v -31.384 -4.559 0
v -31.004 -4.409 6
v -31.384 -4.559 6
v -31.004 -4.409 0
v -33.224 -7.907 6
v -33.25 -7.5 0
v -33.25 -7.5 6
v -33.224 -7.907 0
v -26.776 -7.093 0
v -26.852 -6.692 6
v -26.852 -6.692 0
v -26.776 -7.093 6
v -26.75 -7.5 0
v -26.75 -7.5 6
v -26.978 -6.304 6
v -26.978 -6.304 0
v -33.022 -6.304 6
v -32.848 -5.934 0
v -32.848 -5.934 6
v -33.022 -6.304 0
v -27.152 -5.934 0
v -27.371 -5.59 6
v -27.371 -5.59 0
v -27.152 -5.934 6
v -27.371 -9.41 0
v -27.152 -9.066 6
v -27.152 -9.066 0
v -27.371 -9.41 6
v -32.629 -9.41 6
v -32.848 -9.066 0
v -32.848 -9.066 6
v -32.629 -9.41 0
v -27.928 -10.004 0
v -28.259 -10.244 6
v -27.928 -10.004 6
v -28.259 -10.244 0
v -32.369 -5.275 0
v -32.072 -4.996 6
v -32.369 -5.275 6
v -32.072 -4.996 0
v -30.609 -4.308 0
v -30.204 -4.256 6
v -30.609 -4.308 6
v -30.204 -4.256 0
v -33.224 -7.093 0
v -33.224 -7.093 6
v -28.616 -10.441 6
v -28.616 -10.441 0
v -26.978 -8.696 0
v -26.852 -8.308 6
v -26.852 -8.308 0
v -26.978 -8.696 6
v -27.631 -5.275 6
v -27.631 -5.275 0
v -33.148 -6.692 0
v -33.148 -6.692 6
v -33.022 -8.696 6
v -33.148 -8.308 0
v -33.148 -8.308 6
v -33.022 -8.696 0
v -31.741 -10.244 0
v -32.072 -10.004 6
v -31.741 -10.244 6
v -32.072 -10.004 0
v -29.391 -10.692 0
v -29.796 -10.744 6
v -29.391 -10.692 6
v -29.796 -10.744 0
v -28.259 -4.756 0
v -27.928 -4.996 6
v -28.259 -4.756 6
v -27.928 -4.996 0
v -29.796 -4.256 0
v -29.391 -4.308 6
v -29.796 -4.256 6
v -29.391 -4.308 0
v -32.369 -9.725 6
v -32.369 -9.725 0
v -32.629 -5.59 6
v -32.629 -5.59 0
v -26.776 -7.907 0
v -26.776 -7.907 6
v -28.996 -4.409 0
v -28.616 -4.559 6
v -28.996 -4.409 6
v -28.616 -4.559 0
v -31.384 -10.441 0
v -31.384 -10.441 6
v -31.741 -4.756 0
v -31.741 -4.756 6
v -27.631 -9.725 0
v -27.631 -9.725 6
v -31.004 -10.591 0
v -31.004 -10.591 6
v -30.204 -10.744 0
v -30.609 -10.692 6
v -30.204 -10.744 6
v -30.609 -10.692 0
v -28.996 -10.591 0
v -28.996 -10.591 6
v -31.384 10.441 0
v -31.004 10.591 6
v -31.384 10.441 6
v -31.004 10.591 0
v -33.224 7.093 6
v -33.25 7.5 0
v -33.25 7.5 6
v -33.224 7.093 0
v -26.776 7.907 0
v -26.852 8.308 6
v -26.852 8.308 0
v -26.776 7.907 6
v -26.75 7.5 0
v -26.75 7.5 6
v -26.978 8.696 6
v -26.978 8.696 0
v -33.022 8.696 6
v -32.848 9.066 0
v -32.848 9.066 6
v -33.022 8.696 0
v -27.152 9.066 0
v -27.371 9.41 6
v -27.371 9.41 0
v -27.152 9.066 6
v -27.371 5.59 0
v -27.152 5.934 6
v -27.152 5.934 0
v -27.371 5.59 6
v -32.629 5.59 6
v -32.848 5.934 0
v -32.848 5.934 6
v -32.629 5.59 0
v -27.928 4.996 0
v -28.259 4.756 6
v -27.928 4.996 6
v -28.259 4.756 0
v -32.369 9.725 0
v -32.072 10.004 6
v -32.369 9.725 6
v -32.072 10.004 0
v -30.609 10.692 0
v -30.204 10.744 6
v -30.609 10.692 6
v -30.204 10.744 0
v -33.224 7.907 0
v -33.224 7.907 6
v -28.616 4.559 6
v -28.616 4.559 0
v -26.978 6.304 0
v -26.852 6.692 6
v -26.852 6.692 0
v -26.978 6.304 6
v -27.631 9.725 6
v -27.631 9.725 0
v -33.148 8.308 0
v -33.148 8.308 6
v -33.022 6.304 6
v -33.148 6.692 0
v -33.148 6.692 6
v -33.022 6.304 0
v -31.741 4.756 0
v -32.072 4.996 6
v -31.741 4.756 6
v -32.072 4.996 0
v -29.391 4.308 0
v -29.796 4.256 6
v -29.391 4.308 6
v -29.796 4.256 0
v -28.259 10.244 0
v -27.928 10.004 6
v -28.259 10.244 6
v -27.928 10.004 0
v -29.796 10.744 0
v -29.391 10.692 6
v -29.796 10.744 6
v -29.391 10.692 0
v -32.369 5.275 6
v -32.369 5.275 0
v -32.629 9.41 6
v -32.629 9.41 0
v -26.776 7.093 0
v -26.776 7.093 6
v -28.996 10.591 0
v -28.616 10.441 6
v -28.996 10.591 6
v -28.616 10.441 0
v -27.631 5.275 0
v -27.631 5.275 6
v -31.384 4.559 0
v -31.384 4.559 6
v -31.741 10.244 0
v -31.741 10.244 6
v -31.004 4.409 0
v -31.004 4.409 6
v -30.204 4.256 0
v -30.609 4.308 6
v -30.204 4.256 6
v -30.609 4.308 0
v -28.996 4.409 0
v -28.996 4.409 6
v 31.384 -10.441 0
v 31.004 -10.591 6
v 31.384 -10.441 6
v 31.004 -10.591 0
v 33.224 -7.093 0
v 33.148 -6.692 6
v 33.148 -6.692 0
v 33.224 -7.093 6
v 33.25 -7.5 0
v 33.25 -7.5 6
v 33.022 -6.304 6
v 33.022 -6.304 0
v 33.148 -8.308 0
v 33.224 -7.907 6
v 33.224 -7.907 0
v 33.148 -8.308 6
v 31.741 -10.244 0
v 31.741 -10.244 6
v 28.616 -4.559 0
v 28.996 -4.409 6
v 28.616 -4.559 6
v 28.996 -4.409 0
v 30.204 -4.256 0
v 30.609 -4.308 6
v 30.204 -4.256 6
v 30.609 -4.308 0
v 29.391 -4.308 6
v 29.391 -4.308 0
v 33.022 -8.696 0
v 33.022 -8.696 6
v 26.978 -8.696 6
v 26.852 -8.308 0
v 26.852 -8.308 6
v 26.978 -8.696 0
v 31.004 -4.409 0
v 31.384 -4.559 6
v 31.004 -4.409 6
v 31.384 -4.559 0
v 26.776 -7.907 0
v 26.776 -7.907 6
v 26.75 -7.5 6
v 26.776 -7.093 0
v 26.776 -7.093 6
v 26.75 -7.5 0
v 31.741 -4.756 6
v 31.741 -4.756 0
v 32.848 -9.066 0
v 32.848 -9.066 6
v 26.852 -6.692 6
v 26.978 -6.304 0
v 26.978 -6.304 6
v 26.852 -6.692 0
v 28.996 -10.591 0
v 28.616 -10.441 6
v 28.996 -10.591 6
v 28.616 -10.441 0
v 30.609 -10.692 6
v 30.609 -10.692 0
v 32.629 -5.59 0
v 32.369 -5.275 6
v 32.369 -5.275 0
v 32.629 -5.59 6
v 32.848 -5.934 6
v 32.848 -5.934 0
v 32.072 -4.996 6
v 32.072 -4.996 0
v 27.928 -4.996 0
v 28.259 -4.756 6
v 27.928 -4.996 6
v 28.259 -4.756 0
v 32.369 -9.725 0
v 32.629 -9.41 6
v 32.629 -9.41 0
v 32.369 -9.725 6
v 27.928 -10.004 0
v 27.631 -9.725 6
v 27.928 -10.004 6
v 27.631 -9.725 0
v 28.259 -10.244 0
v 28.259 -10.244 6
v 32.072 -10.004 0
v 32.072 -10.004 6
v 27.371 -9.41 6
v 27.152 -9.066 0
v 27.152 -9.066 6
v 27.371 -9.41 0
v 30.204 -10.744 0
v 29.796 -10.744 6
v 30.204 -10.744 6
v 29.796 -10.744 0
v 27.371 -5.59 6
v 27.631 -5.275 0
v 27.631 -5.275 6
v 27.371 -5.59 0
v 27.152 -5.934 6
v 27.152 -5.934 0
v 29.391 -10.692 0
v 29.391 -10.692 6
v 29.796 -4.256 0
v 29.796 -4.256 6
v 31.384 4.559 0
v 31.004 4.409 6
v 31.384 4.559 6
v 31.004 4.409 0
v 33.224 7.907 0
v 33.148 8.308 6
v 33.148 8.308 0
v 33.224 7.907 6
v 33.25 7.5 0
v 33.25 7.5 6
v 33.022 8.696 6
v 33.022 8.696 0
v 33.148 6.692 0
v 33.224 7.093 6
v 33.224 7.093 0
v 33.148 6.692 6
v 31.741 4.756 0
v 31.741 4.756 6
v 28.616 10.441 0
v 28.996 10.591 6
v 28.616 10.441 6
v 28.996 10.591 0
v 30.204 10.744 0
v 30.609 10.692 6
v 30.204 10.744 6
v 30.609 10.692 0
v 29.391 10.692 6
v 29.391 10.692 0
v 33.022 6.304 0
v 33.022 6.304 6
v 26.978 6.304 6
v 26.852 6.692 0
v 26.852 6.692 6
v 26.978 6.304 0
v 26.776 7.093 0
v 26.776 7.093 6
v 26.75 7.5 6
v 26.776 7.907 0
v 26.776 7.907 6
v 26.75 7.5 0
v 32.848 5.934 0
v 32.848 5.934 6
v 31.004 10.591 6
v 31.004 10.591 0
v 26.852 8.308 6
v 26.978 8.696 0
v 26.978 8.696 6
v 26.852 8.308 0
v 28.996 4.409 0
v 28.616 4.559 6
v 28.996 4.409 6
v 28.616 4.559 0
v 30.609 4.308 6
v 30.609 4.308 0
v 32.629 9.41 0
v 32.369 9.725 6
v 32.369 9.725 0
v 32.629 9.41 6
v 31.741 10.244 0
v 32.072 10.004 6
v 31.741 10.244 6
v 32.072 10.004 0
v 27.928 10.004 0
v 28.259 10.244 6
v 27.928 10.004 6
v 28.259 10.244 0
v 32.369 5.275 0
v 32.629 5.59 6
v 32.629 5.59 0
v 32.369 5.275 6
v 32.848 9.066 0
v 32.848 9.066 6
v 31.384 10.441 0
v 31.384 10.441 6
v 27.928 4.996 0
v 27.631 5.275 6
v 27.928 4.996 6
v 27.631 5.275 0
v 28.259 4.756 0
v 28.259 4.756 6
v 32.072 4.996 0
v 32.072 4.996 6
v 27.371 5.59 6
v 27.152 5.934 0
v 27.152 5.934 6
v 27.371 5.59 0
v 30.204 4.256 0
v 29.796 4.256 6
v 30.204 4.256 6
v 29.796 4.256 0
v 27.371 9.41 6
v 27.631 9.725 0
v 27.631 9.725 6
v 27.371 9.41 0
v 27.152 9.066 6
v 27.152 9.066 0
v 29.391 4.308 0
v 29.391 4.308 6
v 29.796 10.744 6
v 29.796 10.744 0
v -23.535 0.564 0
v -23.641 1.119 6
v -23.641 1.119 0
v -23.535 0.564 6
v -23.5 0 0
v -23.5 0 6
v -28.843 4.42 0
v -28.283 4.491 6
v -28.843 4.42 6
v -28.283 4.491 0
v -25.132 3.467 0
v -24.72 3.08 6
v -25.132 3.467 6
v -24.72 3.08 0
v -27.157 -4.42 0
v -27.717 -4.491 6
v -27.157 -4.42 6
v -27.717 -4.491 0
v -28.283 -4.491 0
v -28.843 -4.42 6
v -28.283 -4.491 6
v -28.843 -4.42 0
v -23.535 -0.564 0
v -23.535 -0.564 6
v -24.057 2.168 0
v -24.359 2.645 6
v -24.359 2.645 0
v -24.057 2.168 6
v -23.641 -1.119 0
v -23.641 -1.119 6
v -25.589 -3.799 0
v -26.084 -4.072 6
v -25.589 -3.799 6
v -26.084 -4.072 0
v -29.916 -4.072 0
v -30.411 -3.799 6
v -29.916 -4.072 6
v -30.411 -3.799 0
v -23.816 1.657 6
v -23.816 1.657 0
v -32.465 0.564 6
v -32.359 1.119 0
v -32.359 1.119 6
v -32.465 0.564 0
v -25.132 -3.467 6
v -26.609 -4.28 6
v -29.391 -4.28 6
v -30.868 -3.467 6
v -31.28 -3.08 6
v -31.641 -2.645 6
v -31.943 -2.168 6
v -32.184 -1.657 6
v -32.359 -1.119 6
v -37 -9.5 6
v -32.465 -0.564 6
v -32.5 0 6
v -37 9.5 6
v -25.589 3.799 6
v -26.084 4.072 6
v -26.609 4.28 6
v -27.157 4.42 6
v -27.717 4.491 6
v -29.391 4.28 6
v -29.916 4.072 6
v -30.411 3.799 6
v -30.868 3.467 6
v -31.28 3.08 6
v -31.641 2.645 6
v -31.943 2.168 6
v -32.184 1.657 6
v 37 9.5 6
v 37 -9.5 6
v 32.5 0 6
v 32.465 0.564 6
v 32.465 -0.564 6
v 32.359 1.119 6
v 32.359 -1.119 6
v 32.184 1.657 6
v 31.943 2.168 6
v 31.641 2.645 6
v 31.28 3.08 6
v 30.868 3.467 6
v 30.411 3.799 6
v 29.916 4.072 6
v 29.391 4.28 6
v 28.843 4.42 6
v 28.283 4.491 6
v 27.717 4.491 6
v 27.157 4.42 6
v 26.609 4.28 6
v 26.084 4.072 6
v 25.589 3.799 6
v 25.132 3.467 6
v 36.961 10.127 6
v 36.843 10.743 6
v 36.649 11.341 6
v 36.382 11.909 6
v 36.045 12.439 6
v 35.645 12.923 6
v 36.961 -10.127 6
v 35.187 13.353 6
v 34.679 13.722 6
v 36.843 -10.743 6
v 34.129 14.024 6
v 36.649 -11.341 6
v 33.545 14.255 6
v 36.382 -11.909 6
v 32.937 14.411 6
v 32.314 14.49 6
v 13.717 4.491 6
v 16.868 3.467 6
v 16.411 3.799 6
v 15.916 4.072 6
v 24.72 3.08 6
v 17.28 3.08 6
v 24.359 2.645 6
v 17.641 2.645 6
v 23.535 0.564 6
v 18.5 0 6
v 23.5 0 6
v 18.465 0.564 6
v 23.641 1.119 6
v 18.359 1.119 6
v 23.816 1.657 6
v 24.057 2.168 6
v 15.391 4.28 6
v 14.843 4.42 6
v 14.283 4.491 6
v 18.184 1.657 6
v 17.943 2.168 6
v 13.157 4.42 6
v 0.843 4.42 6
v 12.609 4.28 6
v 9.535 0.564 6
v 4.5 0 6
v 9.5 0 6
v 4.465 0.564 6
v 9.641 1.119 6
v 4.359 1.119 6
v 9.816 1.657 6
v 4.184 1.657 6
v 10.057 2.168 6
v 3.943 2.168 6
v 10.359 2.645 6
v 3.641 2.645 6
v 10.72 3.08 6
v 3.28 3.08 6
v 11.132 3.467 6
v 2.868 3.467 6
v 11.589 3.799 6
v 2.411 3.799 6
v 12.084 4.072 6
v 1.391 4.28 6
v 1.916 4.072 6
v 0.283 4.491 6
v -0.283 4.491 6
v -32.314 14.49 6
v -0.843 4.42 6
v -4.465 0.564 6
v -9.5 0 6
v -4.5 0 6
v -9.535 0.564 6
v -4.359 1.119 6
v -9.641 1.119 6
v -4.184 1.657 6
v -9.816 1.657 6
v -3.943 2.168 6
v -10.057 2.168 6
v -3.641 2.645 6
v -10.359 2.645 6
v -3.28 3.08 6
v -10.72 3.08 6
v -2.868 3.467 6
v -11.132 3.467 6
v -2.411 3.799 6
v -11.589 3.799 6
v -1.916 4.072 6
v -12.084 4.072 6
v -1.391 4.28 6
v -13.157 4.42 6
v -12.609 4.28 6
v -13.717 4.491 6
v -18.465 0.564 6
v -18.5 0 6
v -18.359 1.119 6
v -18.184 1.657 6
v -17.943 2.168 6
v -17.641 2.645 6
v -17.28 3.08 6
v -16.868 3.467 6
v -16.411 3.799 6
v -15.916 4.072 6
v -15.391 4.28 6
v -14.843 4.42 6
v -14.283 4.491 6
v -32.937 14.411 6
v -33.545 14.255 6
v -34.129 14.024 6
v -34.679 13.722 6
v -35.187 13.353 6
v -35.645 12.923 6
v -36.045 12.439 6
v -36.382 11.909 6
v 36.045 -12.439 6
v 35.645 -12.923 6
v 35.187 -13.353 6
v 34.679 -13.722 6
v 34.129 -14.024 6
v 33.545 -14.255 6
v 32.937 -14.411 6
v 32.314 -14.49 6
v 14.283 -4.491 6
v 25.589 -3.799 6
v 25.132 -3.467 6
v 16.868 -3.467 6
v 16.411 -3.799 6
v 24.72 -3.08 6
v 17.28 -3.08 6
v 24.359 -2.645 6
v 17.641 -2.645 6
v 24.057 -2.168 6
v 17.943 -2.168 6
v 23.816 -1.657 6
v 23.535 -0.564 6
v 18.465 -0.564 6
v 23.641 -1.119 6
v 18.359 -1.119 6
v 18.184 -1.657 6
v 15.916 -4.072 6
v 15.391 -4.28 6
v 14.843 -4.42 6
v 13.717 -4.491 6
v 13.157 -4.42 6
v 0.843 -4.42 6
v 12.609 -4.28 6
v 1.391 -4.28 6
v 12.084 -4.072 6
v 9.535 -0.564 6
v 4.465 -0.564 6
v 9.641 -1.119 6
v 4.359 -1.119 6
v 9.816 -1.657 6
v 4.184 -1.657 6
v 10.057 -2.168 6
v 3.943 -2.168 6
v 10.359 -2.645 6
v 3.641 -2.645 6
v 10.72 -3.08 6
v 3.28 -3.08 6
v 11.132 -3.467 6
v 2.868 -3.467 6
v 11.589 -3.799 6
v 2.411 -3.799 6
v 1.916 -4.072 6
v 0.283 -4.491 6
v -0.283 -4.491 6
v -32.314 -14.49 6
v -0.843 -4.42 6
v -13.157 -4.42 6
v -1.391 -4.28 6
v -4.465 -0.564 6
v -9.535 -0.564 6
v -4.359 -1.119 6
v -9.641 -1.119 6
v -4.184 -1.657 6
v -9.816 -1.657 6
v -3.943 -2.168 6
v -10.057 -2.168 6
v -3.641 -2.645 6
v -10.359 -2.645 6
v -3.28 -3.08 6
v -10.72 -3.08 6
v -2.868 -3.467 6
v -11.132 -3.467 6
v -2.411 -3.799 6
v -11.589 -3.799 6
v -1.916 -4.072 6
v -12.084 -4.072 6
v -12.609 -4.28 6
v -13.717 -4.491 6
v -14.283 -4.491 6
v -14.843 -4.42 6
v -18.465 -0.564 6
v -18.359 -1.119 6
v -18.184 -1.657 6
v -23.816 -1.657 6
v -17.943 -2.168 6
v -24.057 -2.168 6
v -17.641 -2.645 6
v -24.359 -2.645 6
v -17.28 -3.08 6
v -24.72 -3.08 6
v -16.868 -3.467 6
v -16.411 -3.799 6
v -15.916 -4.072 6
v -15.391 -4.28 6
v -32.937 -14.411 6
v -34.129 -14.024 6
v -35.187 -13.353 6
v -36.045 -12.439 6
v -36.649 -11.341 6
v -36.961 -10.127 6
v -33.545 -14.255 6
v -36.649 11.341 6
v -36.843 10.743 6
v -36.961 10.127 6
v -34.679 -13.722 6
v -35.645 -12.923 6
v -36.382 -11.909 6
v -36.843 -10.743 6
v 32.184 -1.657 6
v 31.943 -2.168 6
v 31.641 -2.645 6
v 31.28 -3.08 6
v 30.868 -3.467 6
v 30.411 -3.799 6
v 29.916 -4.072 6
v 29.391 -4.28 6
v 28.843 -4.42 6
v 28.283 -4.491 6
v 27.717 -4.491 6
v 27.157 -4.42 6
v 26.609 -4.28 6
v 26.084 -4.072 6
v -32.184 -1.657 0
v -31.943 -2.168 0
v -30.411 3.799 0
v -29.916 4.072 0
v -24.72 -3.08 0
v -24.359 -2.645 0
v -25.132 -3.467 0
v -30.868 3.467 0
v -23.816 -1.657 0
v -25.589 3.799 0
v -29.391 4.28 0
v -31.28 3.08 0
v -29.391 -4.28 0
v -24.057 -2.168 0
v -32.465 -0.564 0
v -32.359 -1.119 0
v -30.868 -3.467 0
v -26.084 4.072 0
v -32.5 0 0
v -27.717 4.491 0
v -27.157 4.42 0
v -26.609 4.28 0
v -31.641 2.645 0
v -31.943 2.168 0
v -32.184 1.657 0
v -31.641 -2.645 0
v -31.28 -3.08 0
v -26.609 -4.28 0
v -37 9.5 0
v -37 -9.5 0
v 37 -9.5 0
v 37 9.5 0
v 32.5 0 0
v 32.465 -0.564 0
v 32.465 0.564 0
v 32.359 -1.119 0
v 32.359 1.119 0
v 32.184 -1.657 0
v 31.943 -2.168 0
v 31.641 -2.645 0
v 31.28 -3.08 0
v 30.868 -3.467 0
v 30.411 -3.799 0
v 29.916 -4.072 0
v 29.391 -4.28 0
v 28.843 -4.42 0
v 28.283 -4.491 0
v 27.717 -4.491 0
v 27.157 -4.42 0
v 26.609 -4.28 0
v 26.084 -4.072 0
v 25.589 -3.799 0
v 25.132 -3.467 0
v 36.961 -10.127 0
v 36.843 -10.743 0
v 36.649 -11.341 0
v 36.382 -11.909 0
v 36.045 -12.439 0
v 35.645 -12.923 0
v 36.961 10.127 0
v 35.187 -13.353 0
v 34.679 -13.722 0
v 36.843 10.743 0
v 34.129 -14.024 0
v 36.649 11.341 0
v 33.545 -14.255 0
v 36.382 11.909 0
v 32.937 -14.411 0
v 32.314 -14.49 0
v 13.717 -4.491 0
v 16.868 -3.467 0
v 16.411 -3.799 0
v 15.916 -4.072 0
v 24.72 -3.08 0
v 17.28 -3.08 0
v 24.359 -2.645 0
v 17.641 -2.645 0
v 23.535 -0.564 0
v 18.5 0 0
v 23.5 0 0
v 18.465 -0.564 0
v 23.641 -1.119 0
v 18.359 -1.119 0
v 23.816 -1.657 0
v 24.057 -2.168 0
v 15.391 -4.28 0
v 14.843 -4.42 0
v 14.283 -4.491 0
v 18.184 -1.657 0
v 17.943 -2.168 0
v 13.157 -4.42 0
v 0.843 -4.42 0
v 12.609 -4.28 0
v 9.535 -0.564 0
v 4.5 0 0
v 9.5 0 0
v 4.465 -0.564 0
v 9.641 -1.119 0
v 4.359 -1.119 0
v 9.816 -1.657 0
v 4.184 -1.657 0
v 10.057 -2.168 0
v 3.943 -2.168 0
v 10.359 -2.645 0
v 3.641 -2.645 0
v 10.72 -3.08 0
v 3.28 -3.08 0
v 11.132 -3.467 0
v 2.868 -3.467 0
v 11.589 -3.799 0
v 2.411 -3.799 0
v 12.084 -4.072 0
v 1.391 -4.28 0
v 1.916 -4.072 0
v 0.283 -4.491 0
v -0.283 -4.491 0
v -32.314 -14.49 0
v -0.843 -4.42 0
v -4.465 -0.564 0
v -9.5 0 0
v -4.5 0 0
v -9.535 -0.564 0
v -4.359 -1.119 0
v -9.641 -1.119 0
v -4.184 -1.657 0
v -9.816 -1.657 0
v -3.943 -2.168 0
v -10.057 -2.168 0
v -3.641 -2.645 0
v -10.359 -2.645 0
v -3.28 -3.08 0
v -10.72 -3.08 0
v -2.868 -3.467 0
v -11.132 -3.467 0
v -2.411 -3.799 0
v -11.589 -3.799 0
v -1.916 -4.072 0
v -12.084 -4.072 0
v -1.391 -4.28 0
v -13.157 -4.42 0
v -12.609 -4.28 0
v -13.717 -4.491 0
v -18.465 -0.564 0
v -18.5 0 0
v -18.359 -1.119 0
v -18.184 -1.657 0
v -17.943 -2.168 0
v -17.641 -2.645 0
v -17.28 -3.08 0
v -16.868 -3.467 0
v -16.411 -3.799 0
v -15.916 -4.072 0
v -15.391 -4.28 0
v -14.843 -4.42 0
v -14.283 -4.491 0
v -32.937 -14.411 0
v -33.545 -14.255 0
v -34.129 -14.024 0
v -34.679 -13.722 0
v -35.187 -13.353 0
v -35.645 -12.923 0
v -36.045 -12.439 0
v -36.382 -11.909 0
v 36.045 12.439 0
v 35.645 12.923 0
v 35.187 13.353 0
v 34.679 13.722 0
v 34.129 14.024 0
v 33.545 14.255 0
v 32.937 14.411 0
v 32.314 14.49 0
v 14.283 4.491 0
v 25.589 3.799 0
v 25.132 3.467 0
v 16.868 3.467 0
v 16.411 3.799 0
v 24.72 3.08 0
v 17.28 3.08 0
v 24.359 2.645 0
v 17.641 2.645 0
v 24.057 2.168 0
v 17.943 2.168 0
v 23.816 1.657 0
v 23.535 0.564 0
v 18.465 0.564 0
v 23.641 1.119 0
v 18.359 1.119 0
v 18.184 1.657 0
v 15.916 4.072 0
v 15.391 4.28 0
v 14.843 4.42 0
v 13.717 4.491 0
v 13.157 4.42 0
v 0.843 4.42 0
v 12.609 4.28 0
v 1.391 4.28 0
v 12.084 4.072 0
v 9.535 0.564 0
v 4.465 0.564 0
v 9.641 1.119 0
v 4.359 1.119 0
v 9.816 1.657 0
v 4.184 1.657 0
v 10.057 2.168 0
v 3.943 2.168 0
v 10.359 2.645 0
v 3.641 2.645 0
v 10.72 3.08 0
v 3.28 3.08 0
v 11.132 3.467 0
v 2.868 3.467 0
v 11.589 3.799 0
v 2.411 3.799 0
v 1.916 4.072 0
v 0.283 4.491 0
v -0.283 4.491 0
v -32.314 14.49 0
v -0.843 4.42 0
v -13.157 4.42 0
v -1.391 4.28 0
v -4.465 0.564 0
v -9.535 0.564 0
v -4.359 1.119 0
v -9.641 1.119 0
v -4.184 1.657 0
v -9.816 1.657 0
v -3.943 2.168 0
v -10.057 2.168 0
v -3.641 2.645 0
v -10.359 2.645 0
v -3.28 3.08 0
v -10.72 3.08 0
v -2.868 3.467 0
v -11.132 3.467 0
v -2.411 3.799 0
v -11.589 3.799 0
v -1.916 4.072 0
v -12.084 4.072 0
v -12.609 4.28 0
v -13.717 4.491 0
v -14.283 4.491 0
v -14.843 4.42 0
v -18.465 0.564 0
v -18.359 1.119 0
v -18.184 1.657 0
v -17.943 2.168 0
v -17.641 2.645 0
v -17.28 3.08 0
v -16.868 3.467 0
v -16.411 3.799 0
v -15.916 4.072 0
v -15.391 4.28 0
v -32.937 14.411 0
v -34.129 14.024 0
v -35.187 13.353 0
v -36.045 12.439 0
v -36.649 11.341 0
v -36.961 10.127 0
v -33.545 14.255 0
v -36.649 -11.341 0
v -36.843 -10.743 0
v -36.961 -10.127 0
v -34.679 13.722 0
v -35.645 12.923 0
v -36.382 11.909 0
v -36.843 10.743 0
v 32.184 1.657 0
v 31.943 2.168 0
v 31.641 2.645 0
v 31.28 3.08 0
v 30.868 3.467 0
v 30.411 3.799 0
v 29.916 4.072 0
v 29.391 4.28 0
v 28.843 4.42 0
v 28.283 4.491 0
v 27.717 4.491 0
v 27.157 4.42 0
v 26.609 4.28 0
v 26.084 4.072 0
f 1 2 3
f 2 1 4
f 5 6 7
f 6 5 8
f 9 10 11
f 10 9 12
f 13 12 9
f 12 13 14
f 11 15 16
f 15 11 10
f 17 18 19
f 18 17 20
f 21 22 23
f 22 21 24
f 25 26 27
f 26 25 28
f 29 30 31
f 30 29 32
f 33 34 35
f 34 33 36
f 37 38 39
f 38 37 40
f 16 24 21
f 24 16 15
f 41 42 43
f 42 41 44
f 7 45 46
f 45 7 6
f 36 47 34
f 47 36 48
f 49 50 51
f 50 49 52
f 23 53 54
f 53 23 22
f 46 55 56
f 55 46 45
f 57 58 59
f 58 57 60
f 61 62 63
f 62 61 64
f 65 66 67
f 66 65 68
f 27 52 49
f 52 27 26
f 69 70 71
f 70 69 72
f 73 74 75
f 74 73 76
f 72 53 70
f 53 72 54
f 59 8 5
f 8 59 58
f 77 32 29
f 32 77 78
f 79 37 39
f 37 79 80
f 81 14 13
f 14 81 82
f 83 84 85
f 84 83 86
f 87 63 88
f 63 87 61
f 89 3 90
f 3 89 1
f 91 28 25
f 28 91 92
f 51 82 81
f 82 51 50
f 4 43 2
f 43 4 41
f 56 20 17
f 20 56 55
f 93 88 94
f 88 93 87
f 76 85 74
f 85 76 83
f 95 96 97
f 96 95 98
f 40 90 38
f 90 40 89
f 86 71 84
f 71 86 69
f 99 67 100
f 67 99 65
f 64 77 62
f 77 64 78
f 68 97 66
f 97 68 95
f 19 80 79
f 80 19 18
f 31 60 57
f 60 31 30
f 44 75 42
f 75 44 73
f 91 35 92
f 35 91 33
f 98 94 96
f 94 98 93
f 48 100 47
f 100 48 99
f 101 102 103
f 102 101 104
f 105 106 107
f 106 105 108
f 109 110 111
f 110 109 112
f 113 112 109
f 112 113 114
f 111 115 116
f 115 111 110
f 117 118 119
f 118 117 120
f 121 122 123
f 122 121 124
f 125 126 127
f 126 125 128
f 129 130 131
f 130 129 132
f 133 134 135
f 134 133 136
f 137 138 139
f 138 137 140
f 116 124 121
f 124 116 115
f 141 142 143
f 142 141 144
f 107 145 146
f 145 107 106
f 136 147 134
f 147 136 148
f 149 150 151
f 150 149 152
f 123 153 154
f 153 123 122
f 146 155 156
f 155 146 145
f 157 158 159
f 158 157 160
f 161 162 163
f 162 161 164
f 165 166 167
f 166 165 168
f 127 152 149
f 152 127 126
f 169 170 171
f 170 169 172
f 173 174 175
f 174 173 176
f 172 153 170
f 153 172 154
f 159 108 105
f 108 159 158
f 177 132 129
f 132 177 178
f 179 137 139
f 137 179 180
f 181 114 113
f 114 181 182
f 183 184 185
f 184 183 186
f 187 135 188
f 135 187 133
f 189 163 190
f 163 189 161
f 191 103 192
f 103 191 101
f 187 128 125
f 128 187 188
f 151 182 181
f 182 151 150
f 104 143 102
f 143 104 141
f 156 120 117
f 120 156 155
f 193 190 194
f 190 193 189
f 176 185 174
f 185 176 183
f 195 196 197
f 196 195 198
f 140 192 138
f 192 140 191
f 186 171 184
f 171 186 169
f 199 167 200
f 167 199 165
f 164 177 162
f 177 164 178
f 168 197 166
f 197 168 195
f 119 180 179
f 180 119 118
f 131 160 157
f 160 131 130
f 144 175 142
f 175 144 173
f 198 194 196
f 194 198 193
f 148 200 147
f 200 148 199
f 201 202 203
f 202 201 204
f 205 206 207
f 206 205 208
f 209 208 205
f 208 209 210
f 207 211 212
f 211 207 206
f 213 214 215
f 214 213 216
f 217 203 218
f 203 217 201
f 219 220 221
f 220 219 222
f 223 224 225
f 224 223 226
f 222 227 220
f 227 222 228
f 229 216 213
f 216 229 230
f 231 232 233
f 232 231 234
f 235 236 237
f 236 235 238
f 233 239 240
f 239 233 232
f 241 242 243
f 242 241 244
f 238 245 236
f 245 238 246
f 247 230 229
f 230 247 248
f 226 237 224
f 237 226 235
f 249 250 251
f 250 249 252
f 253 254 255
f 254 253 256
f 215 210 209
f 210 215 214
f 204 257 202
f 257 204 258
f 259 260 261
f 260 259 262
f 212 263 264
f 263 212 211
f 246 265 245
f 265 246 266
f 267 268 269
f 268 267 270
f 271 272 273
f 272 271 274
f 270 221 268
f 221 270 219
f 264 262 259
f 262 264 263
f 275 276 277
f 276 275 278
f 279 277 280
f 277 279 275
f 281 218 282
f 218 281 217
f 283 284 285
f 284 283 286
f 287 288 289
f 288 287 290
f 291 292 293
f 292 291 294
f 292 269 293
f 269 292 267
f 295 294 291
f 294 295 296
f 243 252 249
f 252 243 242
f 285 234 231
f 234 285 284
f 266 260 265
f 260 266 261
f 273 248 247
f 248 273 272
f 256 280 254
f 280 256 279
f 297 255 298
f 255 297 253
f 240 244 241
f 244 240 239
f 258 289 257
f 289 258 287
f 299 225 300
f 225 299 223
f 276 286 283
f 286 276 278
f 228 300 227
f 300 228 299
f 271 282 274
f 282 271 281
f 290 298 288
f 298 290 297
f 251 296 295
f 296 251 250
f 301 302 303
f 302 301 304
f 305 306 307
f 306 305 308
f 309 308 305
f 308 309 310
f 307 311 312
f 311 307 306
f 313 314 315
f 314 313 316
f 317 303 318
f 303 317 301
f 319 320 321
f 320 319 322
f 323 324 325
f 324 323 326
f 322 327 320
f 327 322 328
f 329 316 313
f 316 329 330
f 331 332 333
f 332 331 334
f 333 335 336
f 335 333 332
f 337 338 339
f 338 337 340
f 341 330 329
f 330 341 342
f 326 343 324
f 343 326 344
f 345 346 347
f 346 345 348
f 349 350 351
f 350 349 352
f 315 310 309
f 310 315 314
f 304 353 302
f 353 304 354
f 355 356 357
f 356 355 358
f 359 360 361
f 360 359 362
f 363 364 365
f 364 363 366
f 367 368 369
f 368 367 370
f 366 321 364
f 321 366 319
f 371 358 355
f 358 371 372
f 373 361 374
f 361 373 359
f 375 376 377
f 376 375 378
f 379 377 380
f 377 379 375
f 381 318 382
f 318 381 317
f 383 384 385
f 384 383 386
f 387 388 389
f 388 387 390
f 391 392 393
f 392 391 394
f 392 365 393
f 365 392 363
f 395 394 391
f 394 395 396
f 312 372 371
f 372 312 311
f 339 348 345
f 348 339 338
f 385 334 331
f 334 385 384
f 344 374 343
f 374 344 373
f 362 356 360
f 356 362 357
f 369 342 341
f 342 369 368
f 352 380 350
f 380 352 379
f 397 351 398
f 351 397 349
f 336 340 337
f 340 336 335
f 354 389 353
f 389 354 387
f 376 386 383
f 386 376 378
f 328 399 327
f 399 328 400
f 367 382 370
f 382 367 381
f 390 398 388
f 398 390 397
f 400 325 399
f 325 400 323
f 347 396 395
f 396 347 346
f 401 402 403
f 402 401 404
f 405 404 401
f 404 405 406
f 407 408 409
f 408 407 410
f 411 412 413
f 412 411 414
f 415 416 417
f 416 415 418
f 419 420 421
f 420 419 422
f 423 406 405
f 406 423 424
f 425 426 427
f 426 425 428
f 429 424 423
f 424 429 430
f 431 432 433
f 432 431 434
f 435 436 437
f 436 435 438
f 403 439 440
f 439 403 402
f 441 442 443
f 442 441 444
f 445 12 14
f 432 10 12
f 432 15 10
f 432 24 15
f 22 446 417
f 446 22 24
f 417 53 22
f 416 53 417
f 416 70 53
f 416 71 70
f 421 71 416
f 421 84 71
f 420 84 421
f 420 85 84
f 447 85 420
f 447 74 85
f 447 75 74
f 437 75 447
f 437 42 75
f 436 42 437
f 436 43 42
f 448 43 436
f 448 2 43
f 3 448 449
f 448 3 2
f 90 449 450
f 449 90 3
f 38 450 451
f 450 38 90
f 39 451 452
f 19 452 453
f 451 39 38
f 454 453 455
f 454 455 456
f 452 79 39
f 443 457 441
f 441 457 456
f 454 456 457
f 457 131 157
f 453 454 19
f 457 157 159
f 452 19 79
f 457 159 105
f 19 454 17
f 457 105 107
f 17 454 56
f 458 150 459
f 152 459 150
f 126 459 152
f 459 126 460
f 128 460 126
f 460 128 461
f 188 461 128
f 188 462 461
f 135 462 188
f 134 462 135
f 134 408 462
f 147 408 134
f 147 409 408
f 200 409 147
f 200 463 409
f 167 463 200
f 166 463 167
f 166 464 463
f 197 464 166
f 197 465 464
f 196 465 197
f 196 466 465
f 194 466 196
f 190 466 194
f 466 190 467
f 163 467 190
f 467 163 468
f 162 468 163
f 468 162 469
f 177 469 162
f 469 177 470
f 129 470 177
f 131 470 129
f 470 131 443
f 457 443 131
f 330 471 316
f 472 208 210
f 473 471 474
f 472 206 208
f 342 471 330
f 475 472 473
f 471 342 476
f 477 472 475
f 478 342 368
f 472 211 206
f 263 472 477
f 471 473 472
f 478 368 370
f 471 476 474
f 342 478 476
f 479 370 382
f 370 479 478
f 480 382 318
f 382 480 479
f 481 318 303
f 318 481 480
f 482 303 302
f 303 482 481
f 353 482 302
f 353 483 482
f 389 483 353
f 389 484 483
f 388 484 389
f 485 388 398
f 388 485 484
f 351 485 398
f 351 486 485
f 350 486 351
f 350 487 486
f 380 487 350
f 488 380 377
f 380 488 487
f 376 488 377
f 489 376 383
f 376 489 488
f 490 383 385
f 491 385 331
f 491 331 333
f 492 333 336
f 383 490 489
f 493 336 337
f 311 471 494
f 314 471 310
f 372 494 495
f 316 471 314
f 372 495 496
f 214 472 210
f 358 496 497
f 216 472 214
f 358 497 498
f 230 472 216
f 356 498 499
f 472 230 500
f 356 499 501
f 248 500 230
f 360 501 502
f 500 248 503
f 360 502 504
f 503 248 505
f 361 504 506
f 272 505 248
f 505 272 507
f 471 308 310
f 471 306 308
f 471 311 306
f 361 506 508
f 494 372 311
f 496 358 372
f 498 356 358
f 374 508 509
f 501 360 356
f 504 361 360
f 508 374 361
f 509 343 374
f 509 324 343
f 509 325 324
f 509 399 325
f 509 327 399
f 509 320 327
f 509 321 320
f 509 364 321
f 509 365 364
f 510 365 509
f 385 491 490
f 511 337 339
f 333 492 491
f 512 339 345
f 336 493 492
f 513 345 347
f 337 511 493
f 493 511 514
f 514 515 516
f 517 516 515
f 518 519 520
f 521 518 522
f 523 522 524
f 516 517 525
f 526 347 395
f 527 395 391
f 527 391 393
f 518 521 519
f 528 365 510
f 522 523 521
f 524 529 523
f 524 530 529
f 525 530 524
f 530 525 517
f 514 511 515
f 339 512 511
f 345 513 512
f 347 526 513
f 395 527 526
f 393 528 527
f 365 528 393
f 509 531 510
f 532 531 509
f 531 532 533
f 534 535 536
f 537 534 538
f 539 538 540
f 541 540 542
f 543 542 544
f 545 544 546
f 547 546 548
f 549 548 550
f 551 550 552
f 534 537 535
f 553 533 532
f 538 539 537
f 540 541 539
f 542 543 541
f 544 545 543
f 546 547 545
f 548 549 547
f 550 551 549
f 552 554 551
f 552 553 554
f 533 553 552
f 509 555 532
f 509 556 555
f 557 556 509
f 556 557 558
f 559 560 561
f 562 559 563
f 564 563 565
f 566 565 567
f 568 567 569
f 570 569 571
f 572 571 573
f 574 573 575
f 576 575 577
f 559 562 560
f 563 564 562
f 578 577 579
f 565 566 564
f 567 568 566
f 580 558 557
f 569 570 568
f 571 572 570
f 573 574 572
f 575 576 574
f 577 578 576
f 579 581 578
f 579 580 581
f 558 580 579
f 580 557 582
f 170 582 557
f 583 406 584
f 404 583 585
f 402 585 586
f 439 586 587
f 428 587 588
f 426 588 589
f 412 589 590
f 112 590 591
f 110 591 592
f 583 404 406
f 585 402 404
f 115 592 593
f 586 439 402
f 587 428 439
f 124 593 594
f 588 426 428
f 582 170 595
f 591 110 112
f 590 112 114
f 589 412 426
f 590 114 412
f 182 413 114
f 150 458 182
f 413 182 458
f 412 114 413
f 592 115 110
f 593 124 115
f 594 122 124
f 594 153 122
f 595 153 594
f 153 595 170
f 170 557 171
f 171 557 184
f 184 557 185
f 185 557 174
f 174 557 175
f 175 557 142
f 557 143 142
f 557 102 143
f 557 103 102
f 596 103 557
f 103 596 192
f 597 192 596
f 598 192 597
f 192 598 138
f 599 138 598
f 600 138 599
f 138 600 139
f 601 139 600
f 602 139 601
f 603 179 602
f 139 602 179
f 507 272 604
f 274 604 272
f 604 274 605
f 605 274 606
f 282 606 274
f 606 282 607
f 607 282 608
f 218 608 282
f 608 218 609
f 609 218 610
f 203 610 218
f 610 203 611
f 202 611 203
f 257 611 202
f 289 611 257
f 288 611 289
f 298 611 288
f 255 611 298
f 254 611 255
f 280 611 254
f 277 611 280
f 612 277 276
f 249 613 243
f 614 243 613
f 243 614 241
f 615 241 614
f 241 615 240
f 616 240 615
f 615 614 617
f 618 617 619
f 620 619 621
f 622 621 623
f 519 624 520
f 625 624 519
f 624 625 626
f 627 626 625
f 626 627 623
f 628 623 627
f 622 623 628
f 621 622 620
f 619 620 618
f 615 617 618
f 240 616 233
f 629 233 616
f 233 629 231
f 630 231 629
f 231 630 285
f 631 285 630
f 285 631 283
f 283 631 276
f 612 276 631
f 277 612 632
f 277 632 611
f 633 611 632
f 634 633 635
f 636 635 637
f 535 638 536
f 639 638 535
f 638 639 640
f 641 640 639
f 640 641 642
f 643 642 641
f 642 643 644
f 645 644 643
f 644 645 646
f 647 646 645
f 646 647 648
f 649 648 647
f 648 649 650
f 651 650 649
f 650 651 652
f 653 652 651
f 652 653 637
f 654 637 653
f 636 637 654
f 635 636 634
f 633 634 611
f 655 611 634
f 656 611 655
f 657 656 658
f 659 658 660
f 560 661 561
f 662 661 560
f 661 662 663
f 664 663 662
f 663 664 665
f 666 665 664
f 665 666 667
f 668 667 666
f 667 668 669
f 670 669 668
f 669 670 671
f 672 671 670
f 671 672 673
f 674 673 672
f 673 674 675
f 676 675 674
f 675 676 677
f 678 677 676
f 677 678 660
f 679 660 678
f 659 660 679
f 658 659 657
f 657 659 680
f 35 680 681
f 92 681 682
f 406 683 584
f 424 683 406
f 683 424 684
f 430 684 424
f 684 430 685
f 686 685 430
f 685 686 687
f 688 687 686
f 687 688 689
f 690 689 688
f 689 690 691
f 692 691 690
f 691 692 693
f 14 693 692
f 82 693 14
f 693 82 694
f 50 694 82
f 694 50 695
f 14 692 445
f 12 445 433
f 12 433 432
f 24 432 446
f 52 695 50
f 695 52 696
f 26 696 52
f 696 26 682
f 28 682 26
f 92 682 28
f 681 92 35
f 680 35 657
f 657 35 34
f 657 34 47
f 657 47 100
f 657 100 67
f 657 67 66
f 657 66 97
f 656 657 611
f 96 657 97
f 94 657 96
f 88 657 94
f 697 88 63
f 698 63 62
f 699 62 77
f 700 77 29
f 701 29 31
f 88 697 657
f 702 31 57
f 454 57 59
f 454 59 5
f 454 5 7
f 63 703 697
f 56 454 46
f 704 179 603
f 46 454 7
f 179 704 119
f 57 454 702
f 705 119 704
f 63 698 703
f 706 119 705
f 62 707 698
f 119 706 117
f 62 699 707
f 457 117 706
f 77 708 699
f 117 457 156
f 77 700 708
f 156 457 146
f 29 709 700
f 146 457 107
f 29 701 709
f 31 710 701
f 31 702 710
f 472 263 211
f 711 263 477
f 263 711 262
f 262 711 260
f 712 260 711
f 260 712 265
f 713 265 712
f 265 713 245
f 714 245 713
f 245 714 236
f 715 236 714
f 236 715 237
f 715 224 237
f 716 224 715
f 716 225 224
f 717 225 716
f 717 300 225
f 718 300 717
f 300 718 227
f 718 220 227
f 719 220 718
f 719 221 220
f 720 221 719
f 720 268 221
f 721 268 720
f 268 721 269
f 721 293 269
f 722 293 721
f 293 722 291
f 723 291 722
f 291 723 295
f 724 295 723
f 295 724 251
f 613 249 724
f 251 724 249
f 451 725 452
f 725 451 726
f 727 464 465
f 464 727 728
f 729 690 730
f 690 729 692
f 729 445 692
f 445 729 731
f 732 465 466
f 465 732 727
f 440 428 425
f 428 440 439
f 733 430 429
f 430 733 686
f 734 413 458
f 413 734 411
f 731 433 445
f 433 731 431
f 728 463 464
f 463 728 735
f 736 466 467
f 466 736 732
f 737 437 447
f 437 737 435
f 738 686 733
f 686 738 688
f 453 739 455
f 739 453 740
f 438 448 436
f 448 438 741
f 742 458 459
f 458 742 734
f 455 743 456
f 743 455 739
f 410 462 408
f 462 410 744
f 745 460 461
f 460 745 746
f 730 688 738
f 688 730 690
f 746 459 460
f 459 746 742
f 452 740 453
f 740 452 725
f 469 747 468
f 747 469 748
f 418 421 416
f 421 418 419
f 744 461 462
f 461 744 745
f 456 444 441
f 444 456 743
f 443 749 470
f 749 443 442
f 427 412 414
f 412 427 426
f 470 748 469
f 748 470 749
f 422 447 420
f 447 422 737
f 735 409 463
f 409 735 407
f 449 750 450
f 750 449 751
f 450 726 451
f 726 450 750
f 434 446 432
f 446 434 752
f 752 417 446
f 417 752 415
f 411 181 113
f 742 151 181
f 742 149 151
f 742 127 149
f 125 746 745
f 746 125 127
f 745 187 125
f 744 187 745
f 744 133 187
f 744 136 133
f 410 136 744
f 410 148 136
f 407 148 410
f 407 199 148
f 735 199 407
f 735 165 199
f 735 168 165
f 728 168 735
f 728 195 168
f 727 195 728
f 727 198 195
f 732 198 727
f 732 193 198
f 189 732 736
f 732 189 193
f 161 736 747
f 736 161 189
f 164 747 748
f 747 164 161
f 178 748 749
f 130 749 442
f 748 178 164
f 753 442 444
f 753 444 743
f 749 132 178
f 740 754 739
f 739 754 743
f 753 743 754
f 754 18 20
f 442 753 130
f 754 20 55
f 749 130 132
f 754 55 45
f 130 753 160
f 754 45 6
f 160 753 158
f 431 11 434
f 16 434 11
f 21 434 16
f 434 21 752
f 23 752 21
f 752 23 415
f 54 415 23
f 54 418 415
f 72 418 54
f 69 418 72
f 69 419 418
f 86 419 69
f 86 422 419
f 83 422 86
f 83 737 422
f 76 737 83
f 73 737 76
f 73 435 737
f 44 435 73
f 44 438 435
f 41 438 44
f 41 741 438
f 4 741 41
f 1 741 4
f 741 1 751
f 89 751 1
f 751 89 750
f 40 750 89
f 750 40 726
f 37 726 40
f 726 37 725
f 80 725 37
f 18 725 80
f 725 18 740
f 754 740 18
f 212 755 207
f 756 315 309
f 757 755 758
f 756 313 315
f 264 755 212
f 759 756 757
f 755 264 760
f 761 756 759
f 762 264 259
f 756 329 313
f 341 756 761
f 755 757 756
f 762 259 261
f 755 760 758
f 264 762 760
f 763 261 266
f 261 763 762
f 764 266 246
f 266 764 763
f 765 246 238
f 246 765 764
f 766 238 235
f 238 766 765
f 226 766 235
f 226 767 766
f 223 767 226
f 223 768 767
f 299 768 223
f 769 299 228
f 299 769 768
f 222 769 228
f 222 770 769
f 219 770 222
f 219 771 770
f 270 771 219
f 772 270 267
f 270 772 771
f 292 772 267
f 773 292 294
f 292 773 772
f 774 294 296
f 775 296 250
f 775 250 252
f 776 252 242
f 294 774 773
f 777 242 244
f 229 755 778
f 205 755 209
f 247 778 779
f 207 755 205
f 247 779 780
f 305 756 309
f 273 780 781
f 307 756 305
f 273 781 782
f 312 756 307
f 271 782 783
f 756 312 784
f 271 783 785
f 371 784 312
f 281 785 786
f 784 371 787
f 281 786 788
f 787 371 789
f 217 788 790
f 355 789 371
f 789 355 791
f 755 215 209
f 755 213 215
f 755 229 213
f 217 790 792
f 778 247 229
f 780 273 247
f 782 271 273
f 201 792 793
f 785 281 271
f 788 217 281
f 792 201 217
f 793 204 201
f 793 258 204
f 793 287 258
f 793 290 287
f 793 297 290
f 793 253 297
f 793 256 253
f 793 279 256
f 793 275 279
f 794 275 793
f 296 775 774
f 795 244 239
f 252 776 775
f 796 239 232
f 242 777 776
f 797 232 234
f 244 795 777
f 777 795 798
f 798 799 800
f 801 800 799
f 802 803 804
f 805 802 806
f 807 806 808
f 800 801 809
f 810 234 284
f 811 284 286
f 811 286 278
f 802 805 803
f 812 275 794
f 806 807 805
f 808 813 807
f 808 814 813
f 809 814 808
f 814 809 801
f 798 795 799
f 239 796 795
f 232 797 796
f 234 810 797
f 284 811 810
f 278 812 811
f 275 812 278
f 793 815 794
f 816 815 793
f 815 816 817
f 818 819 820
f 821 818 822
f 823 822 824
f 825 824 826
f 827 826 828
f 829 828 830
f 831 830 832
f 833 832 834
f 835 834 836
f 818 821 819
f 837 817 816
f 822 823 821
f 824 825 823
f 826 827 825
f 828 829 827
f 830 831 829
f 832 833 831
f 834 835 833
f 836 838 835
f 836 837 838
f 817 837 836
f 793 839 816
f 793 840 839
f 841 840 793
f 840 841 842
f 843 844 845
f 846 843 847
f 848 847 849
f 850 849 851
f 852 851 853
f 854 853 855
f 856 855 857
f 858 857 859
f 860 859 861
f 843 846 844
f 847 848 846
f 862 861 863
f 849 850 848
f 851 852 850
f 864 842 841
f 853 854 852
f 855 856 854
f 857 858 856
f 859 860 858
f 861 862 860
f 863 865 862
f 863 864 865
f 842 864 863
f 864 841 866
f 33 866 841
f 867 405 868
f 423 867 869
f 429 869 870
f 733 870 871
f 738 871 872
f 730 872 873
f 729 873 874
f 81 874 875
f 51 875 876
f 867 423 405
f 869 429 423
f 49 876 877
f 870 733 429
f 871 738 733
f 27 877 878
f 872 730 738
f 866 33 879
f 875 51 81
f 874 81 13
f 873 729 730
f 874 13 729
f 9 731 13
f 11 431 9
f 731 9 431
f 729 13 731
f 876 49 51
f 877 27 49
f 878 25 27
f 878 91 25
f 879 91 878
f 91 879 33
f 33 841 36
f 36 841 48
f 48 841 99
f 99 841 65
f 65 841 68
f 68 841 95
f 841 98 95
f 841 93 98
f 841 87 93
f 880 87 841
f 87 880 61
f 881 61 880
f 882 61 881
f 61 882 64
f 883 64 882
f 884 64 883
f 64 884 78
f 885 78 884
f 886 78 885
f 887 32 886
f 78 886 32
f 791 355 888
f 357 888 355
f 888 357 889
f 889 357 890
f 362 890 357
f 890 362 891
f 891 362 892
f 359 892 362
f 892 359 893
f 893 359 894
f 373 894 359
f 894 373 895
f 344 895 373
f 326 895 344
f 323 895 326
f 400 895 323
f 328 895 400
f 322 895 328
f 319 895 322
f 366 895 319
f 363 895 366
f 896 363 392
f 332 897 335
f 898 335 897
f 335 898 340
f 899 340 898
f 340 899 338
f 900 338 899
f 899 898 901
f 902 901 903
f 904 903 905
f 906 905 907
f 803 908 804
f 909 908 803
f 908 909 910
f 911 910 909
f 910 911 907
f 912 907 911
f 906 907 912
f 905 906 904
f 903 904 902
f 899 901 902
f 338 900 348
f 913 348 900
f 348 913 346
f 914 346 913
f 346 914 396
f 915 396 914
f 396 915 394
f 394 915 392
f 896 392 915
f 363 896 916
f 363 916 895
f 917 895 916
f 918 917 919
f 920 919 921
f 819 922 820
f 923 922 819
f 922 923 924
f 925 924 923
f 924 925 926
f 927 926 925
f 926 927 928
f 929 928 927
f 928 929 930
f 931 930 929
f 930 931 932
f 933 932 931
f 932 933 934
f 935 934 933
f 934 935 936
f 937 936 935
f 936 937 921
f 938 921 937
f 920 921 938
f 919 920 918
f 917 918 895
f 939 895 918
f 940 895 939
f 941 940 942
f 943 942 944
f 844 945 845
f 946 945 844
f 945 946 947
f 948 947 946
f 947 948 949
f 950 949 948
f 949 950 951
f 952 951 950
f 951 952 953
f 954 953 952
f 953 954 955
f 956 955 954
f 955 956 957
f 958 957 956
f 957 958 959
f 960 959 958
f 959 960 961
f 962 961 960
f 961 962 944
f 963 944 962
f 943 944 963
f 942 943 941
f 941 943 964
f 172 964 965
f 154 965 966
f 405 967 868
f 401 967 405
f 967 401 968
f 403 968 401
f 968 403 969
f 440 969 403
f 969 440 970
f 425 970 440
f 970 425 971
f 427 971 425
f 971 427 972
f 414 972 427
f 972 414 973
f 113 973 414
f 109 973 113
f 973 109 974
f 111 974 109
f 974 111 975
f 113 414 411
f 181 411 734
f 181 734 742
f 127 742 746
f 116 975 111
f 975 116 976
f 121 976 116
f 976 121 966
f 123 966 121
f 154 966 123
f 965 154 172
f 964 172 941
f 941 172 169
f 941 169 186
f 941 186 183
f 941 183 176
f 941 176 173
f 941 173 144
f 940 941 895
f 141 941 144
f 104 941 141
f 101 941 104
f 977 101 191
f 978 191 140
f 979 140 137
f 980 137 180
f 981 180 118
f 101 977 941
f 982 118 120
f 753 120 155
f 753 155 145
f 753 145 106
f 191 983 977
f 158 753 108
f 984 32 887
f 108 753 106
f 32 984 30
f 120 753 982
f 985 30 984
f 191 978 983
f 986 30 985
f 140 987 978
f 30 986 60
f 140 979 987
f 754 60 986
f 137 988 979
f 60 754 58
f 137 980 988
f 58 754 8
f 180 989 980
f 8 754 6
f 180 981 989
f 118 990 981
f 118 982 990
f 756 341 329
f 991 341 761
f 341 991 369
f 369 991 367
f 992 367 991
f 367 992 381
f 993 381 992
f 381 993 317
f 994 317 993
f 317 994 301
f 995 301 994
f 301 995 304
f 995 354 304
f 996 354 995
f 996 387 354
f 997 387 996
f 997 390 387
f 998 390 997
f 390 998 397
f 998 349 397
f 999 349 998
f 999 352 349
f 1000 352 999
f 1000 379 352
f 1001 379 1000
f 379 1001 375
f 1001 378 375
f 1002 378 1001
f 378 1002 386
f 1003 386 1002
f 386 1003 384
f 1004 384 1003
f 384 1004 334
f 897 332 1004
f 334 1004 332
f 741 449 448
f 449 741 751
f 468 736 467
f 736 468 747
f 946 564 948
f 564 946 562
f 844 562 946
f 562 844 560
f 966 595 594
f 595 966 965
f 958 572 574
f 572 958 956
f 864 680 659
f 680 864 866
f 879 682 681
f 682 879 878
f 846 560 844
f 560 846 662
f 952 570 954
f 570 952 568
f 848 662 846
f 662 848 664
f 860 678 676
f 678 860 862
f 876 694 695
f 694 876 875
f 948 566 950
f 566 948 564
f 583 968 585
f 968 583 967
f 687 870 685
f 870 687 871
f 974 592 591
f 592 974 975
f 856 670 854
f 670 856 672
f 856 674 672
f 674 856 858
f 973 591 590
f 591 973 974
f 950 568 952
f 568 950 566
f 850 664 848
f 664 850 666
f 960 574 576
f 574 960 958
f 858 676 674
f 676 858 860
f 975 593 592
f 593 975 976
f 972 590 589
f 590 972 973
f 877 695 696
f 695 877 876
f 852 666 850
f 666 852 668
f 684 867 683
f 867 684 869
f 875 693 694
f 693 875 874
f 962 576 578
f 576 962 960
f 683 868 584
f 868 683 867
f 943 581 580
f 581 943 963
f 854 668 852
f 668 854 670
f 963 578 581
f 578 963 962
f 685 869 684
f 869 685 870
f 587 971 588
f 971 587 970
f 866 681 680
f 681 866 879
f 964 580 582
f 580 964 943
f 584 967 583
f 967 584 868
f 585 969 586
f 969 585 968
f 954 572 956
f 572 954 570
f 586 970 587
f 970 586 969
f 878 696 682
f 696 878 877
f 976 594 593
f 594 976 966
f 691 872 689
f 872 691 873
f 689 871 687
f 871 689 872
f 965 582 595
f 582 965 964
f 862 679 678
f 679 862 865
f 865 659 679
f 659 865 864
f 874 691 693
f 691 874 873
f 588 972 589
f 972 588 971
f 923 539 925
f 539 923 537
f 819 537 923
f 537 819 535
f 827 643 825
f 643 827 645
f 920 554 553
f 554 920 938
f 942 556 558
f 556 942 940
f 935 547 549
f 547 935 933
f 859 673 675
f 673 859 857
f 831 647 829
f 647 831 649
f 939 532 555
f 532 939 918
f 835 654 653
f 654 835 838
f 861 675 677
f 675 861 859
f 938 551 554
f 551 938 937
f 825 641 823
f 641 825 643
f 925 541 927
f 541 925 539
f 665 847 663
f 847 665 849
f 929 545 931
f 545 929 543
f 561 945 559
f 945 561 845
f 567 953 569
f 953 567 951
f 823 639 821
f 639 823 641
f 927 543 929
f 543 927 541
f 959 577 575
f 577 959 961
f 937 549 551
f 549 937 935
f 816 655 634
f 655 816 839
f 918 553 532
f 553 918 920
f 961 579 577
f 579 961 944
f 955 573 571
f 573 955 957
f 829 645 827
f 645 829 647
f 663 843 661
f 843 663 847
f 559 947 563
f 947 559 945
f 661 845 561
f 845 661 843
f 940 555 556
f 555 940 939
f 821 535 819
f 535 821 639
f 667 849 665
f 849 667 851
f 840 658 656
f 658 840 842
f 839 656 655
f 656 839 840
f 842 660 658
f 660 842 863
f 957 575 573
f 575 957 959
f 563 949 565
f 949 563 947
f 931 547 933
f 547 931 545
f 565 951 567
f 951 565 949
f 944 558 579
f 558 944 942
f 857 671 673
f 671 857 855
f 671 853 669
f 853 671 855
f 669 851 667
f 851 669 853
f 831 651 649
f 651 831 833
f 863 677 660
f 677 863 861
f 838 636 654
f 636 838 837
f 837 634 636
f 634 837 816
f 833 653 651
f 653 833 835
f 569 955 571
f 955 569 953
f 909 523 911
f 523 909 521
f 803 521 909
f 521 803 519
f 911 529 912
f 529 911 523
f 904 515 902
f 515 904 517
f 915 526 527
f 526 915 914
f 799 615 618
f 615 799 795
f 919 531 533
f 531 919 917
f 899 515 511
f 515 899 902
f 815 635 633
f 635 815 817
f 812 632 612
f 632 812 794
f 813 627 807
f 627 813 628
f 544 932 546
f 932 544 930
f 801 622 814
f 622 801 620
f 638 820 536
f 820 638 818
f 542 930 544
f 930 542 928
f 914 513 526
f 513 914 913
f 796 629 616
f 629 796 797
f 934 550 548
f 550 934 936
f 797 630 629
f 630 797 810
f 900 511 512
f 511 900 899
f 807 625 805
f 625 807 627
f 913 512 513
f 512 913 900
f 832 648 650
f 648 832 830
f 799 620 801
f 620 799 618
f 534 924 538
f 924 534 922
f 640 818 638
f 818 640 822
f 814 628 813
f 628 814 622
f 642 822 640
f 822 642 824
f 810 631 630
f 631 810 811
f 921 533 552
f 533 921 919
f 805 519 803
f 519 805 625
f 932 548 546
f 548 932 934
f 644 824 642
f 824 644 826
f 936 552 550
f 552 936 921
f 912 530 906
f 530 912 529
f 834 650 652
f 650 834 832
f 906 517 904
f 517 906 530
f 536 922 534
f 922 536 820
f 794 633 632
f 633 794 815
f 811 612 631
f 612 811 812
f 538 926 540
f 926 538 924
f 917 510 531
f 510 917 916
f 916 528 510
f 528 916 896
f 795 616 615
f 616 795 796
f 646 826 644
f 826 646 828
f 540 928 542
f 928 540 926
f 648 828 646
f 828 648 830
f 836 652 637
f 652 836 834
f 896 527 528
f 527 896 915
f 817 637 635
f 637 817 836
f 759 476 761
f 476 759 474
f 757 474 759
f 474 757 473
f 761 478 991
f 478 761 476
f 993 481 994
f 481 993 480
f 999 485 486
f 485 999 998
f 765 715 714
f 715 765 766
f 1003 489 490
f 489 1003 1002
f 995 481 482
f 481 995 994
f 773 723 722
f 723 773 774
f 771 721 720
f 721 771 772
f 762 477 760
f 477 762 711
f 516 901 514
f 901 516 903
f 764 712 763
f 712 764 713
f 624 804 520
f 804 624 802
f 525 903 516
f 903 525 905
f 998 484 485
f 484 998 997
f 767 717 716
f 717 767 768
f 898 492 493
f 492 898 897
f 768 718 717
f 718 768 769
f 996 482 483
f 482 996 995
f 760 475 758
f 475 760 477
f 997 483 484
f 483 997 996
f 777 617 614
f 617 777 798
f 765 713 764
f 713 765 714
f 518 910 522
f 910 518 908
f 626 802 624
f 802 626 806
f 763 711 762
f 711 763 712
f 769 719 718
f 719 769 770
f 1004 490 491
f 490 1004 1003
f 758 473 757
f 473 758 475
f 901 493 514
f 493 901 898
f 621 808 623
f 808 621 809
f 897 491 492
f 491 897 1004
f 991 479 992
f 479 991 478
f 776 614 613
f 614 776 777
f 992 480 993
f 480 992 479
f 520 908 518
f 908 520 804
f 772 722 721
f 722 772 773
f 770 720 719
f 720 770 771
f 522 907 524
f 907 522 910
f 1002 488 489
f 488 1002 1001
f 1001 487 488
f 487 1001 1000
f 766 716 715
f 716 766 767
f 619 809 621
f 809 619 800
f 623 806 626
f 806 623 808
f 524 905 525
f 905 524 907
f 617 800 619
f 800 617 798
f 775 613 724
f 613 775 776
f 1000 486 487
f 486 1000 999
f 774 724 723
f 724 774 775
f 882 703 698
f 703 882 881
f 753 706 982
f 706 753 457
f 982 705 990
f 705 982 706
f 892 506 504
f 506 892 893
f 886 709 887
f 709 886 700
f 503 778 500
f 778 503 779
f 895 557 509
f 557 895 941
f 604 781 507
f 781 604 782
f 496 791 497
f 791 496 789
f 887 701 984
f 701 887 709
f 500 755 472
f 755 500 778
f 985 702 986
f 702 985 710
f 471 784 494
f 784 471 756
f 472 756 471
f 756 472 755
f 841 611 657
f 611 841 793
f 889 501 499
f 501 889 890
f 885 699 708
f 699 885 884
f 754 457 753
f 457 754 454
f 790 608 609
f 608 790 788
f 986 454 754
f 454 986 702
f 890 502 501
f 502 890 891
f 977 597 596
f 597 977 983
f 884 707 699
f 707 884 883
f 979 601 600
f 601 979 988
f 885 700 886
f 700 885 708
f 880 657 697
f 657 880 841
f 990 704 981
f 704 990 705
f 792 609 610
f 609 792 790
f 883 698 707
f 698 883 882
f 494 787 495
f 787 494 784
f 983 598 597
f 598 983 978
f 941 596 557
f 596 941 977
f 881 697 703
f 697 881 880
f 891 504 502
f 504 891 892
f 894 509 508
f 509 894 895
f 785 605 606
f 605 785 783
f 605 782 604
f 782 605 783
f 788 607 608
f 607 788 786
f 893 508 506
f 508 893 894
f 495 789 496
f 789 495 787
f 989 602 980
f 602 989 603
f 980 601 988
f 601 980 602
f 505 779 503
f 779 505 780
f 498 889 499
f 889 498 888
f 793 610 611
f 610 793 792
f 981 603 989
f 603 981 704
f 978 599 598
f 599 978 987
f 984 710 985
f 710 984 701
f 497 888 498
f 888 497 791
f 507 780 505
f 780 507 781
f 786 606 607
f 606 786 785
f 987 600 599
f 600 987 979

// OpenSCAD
$fn = 50;

difference() {
	union() {
		hull() {
			translate(v = [-32.0, 9.5, 0]) {
				cylinder(h = 6, r = 5);
			}
			translate(v = [32.0, 9.5, 0]) {
				cylinder(h = 6, r = 5);
			}
			translate(v = [-32.0, -9.5, 0]) {
				cylinder(h = 6, r = 5);
			}
			translate(v = [32.0, -9.5, 0]) {
				cylinder(h = 6, r = 5);
			}
		}
	}
	union() {
		translate(v = [-30.0, -7.5, -100.0]) {
			cylinder(h = 200, r = 3.25);
		}
		translate(v = [-30.0, 7.5, -100.0]) {
			cylinder(h = 200, r = 3.25);
		}
		translate(v = [30.0, -7.5, -100.0]) {
			cylinder(h = 200, r = 3.25);
		}
		translate(v = [30.0, 7.5, -100.0]) {
			cylinder(h = 200, r = 3.25);
		}
		translate(v = [-30.0, -7.5, -100.0]) {
			cylinder(h = 200, r = 1.8);
		}
		translate(v = [-30.0, 7.5, -100.0]) {
			cylinder(h = 200, r = 1.8);
		}
		translate(v = [30.0, -7.5, -100.0]) {
			cylinder(h = 200, r = 1.8);
		}
		translate(v = [30.0, 7.5, -100.0]) {
			cylinder(h = 200, r = 1.8);
		}
		translate(v = [-28.0, 0, 0.0]) {
			cylinder(h = 6, r = 4.5);
		}
		translate(v = [-14.0, 0, 0.0]) {
			cylinder(h = 6, r = 4.5);
		}
		cylinder(h = 6, r = 4.5);
		translate(v = [14.0, 0, 0.0]) {
			cylinder(h = 6, r = 4.5);
		}
		translate(v = [28.0, 0, 0.0]) {
			cylinder(h = 6, r = 4.5);
		}
	}
}
